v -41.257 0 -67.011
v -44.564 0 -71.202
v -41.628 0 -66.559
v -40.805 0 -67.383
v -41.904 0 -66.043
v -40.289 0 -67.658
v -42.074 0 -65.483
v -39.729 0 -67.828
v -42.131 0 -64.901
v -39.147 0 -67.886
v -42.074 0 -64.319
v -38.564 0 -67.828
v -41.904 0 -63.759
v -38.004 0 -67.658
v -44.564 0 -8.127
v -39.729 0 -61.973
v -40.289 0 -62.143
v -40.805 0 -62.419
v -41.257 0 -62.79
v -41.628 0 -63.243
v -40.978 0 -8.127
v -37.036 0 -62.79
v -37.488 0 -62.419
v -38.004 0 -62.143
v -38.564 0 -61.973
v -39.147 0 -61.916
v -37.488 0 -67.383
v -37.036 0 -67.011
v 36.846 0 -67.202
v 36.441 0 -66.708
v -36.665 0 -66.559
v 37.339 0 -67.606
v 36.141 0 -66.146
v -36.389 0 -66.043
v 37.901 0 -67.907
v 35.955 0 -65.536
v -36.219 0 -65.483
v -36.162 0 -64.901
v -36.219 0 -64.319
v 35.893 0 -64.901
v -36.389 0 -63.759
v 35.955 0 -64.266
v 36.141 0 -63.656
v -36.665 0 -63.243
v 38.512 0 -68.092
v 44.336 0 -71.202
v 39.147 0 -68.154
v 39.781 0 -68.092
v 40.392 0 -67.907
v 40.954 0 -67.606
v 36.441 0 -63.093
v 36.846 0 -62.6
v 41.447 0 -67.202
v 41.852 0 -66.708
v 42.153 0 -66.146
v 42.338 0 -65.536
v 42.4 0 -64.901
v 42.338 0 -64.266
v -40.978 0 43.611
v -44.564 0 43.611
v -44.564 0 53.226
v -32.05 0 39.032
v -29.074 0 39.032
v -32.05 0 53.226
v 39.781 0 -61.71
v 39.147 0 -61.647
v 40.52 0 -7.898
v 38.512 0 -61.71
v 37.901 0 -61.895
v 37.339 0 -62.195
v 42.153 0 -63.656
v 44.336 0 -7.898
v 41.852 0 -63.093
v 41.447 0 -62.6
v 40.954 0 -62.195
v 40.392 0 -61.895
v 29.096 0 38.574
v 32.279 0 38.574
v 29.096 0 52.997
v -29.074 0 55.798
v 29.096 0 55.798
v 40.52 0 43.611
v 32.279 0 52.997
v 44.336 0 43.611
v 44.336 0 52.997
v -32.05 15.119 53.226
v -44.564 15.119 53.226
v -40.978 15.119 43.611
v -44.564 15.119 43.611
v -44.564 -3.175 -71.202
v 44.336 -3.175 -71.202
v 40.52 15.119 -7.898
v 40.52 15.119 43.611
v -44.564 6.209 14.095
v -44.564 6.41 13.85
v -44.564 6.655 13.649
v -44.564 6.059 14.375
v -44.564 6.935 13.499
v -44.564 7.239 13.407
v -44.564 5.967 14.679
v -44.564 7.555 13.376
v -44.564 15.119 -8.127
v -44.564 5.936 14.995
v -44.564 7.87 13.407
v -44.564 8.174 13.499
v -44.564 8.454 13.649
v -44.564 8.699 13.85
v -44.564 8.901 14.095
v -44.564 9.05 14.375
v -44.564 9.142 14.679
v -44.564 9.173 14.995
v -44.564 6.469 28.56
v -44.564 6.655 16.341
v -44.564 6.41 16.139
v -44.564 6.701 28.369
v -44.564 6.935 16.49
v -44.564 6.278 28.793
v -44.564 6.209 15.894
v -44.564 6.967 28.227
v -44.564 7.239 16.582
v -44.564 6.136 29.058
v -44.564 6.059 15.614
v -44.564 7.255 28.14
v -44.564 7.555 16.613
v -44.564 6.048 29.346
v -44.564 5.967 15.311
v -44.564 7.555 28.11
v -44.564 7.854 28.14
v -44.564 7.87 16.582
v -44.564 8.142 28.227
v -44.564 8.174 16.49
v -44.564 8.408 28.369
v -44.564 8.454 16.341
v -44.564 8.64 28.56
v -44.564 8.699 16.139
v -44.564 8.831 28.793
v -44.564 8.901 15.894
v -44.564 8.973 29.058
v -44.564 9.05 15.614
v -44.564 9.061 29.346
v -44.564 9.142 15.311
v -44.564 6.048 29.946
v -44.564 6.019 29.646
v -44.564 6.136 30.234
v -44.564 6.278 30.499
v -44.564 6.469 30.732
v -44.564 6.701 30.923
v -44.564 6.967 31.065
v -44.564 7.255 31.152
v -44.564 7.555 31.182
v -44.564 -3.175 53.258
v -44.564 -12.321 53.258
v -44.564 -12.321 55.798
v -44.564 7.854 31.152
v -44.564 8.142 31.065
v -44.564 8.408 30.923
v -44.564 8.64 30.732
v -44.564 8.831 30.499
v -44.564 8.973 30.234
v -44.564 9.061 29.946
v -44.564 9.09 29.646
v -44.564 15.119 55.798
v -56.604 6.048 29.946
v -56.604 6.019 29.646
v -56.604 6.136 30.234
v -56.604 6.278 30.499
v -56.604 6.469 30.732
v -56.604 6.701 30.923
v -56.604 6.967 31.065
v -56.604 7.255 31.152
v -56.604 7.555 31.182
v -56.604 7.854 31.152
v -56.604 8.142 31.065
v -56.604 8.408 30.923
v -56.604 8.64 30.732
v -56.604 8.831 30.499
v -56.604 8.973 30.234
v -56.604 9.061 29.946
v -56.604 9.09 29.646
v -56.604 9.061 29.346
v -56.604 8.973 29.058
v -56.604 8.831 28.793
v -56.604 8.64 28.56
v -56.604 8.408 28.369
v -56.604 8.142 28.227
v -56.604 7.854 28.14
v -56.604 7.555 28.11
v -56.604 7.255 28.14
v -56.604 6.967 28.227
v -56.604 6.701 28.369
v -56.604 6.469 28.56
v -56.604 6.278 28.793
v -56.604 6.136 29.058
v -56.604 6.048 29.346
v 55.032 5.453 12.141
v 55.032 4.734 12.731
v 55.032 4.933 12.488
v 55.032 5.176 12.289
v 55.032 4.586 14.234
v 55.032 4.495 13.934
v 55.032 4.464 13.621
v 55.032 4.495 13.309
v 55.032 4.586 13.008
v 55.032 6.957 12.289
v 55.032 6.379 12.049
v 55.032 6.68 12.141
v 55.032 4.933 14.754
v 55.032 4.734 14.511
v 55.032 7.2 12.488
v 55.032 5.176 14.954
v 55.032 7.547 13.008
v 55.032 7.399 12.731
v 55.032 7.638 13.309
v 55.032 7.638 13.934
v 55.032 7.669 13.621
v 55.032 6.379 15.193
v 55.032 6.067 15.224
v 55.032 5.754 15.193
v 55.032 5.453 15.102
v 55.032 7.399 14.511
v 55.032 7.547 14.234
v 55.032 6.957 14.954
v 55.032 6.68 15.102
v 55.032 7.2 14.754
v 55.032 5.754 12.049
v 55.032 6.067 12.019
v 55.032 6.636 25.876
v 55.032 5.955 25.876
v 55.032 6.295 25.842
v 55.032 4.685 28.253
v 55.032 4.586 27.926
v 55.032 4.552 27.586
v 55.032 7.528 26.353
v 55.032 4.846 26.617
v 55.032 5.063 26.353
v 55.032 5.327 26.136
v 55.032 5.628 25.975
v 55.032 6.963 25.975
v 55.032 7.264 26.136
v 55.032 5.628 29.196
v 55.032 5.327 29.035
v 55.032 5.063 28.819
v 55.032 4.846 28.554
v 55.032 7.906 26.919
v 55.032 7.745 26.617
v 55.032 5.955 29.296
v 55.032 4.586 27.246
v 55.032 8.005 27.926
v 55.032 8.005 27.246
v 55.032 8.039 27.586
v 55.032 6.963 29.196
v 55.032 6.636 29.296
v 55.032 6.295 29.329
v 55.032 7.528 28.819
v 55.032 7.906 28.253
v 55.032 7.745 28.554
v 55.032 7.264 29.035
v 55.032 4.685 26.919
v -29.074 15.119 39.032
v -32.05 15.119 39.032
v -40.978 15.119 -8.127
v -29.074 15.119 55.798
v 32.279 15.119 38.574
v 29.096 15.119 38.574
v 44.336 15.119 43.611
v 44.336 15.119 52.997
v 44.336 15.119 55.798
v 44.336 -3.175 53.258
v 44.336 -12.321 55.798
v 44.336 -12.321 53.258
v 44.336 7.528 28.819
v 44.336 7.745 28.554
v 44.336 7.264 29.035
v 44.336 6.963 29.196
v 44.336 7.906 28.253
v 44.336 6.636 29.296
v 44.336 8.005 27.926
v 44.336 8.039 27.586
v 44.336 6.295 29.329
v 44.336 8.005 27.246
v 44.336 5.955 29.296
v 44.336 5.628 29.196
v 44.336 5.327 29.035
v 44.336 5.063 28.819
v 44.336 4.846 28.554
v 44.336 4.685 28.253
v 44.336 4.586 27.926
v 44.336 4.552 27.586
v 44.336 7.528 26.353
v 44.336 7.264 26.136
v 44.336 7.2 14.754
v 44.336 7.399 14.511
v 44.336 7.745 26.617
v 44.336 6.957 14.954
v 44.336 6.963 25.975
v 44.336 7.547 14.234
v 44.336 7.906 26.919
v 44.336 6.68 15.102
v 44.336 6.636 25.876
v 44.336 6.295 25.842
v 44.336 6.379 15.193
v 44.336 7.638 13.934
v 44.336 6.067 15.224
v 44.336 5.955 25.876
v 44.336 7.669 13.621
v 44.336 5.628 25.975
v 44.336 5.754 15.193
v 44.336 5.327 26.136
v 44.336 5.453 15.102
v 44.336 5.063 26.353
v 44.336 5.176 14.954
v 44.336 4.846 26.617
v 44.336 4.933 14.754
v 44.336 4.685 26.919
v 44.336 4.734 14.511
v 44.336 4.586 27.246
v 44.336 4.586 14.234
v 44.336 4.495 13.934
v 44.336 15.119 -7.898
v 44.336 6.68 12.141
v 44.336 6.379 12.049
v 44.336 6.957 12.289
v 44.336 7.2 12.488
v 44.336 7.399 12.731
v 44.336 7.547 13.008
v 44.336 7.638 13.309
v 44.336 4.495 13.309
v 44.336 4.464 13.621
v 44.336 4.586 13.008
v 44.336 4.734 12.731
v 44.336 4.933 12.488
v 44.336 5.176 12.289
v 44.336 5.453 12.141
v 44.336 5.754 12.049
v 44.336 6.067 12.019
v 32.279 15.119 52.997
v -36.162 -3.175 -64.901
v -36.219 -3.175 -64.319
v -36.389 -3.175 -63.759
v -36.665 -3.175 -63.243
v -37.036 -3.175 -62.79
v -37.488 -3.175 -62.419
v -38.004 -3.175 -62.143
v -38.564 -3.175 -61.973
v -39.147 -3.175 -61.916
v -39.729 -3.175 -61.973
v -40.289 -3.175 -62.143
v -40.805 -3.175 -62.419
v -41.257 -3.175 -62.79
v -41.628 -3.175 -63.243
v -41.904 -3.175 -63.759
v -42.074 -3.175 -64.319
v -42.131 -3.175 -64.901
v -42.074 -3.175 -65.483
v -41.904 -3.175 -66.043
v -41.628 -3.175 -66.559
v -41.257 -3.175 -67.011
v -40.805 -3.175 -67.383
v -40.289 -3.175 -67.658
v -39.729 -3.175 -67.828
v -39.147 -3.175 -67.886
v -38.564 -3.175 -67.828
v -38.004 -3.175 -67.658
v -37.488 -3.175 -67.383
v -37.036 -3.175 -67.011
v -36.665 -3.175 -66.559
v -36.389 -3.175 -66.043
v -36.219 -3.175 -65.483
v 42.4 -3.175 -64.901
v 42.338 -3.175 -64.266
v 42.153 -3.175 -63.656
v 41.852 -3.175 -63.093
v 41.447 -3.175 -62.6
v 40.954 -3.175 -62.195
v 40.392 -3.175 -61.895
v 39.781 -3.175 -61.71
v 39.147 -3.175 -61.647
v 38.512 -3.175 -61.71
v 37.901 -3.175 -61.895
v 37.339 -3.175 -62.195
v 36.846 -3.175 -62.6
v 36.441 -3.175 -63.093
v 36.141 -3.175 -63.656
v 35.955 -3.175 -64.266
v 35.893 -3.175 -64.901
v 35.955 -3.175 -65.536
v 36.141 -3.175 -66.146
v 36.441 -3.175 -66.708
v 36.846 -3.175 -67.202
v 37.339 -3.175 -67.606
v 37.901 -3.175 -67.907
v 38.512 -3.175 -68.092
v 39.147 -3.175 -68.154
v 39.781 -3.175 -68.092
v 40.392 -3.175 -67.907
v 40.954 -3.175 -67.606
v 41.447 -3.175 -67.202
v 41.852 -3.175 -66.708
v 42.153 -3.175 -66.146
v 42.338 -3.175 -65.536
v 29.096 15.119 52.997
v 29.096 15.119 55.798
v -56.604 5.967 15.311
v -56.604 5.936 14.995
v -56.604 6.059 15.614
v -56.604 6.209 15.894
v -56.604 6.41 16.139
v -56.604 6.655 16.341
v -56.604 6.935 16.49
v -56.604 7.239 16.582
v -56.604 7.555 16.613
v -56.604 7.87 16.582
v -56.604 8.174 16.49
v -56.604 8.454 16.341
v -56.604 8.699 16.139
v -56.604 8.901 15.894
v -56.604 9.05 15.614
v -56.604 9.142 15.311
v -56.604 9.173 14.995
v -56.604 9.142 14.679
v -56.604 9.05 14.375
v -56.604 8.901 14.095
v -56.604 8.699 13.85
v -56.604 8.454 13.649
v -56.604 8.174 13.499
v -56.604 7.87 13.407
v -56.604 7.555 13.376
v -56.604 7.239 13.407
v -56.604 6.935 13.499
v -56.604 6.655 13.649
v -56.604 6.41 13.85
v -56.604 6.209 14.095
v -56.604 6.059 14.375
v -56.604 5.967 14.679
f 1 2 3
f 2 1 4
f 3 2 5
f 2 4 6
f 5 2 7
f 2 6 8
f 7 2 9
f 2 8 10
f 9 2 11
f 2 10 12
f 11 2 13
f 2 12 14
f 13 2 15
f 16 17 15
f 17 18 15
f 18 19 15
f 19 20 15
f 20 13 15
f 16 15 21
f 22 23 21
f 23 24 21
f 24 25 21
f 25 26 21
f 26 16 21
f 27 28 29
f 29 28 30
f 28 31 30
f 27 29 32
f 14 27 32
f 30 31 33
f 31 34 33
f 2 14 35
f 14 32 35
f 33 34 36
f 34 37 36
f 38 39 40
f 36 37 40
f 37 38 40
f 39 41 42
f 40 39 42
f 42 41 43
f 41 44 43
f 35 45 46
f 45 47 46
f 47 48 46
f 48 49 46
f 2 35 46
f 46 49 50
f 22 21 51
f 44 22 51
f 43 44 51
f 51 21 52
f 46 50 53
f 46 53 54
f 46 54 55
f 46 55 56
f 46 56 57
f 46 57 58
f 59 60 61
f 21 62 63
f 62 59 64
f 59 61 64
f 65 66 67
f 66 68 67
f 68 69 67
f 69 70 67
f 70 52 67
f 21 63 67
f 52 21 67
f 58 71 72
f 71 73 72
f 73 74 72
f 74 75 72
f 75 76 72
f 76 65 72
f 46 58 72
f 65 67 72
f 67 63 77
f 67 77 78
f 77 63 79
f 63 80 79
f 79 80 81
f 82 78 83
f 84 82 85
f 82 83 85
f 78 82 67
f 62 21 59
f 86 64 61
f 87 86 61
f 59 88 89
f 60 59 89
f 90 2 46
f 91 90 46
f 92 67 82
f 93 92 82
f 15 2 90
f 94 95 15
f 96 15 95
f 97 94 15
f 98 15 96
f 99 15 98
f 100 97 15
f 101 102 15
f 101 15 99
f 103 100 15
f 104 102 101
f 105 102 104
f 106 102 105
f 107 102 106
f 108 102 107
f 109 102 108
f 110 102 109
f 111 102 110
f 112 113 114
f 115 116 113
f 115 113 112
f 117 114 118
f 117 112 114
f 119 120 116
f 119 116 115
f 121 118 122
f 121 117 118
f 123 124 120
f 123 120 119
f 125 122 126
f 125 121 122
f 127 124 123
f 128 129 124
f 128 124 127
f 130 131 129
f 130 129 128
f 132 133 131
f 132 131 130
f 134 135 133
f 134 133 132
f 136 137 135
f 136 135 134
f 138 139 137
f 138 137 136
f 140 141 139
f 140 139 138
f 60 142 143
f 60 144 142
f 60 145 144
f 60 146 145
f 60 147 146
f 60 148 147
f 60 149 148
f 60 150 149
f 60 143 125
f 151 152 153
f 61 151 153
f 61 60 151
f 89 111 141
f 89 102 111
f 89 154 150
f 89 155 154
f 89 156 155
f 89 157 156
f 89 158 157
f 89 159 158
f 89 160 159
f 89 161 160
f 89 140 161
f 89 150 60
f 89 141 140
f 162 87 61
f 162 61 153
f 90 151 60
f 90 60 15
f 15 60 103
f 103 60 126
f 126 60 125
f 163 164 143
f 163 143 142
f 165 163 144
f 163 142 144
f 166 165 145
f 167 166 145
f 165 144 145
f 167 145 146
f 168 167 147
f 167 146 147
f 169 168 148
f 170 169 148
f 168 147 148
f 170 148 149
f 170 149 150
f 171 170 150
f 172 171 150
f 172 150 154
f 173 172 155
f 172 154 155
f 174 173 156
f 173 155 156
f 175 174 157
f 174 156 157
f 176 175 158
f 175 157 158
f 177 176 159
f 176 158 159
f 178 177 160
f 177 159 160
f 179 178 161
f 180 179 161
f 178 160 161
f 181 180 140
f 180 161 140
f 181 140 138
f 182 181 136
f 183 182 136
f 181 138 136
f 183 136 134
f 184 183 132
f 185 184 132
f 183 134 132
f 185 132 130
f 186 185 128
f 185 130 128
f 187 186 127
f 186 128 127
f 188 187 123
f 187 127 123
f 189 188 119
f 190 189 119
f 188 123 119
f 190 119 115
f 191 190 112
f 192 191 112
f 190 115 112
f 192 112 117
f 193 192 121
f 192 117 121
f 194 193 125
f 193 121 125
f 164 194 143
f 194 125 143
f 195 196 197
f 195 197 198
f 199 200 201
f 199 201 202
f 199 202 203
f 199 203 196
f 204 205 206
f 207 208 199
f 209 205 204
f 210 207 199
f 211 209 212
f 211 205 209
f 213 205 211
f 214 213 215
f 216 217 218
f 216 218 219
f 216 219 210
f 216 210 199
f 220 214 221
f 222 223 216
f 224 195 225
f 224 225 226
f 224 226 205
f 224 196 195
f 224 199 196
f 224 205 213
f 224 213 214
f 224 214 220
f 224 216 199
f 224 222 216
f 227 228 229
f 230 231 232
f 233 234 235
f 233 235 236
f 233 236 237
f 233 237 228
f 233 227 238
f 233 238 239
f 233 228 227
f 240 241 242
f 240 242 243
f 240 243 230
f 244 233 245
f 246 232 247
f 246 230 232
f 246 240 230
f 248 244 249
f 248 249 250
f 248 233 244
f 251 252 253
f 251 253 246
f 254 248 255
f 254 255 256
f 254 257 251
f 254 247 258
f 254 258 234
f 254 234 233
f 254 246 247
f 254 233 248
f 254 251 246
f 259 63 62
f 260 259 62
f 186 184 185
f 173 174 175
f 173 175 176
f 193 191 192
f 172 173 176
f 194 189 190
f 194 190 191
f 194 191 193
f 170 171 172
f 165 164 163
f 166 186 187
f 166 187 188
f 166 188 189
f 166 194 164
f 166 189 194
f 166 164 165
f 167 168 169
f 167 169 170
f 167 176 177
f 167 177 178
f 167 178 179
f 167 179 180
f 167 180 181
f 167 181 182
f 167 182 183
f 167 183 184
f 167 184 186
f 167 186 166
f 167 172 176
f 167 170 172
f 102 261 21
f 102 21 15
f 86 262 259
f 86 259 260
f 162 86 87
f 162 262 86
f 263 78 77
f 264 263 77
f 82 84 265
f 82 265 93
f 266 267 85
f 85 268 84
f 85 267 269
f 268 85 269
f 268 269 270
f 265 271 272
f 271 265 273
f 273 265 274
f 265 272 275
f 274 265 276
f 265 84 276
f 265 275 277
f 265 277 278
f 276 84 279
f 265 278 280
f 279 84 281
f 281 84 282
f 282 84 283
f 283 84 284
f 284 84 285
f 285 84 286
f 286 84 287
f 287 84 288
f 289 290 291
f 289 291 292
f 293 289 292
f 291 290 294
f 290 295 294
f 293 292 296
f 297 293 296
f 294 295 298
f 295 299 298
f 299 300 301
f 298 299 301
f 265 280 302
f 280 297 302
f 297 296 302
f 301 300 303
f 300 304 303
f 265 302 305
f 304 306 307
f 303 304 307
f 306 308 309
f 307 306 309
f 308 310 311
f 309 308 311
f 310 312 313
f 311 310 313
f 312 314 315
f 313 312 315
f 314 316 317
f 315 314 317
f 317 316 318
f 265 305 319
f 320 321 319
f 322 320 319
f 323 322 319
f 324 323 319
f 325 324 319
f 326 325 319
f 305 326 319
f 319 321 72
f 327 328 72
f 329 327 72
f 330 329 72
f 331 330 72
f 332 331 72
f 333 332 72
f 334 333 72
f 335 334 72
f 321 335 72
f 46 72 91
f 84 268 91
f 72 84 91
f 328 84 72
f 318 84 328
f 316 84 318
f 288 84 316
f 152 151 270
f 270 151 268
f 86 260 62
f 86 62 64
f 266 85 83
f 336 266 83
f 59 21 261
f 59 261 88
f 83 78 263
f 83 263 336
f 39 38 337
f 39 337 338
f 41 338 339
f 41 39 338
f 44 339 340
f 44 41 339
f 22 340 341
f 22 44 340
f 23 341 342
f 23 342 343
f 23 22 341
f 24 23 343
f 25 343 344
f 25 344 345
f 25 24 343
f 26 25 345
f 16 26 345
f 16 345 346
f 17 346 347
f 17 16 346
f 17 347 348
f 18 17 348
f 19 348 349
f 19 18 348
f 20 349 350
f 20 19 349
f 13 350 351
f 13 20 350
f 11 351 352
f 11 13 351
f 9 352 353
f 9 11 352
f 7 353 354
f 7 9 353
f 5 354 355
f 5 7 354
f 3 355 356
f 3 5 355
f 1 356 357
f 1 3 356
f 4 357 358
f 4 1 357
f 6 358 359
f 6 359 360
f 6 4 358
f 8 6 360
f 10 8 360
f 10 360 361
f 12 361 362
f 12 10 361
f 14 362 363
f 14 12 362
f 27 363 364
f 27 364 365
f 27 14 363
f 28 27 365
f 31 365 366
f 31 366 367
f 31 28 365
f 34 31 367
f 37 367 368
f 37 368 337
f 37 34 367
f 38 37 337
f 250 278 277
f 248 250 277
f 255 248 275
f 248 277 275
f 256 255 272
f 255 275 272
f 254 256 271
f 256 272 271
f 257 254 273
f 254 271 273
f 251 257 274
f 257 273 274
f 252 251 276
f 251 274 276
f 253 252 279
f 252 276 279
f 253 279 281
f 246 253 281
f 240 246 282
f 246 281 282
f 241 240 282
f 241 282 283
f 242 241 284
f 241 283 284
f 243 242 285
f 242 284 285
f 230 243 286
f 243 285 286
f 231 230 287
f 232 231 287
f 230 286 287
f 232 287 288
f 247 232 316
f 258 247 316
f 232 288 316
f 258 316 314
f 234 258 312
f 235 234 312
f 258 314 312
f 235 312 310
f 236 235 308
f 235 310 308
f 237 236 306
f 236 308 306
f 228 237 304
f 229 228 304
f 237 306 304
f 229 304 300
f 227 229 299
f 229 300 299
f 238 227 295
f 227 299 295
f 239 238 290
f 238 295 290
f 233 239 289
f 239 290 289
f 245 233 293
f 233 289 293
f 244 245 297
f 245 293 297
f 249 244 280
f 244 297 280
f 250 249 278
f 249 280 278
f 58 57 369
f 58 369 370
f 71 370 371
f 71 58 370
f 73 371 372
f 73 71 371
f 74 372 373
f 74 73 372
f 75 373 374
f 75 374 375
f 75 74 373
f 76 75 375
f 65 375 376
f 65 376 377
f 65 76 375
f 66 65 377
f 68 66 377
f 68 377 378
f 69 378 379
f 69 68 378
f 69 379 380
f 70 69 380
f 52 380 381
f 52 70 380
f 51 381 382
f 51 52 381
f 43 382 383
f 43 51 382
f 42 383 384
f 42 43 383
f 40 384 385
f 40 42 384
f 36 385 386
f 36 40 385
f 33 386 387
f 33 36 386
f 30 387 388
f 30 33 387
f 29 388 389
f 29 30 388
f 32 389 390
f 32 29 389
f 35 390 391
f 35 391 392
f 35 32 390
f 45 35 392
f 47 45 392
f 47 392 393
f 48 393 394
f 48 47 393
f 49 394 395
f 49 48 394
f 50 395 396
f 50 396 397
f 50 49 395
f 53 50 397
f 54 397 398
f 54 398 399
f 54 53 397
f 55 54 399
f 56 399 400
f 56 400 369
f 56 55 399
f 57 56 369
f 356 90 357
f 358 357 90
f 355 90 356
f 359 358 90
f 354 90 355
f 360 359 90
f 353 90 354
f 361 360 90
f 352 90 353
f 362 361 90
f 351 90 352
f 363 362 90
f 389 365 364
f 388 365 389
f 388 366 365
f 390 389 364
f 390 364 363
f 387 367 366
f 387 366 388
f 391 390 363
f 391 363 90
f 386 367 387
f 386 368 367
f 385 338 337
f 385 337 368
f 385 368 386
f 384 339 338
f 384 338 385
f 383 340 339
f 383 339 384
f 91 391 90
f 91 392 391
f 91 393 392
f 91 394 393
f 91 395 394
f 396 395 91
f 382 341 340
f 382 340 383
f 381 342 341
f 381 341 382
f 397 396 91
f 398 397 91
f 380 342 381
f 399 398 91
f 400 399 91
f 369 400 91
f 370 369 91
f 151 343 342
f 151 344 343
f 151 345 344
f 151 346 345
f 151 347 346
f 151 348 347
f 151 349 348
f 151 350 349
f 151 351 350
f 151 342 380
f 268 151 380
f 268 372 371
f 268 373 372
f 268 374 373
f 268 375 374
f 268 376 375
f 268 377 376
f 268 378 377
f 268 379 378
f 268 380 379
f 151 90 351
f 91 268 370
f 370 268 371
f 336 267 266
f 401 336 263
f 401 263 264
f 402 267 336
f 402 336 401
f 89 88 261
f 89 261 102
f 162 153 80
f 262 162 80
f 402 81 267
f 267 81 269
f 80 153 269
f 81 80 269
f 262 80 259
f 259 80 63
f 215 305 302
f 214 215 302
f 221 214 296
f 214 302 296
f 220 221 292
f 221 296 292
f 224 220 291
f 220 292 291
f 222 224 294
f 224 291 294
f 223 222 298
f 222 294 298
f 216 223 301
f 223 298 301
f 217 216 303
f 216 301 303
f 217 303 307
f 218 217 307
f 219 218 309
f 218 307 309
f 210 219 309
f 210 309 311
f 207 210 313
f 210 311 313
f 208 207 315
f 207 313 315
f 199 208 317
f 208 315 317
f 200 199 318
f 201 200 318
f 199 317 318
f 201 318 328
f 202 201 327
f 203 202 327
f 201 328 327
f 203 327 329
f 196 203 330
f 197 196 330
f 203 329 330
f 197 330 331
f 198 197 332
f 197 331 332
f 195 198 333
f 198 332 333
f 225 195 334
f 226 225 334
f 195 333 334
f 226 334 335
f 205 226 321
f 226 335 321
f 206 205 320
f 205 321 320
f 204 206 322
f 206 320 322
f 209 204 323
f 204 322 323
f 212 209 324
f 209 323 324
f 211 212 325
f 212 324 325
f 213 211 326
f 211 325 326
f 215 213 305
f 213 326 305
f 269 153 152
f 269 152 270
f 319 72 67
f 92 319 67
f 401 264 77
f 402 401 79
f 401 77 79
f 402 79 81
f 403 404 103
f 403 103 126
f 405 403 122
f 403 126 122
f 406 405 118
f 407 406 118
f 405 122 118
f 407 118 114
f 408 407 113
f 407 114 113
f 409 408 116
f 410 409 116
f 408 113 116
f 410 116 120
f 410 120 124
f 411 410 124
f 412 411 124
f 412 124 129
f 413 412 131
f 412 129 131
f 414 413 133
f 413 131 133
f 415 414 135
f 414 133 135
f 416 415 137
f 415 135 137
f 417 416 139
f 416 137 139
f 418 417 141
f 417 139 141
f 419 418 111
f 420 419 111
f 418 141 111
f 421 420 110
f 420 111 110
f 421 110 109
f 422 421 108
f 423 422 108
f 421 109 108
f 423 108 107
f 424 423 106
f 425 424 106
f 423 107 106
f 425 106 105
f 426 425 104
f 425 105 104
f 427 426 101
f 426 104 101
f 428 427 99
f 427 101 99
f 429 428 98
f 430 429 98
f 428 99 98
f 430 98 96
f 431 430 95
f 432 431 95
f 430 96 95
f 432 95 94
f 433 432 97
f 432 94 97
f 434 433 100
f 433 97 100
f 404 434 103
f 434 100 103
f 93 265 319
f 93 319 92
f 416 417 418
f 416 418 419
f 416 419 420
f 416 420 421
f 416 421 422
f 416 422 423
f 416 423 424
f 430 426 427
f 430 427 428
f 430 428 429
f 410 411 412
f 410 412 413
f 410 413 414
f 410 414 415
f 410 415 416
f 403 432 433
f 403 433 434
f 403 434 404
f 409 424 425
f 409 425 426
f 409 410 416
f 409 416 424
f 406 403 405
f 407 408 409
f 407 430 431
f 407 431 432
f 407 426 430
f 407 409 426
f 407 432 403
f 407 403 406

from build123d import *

# Parameters (mm, degrees)
F0_W     = 88.9
F0_H     = 127
F0_R     = 2.9848451786
F0_R_2   = 3.2536679358
F1_DEPTH = 3.175
F2_W     = 88.9
F2_H     = 2.54
F3_DEPTH = 9.14618
F4_W     = 3.1831779712
F4_H     = 14.4224017859
F4_W_2   = 3.8154479831
F4_H_2   = 51.5085849911
F4_W_3   = 2.9760506004
F4_H_3   = 14.1934752464
F4_W_4   = 3.5865214437
F4_H_4   = 51.7375124618
F5_DEPTH = 15.11912
F6_R     = 1.7434569234
F6_R_2   = 1.6024885699
F7_DEPTH = 10.69614
F8_R     = 1.5356896605
F8_R_2   = 1.6187597598
F9_DEPTH = 12.03988


with BuildPart() as f1:
    # F0 (on Front) → F1 (new body)
    with BuildSketch(Plane.XZ):
        with Locations((-0.1144651324, -7.7015060779)):
            Rectangle(F0_W, F0_H)
        with Locations((-39.1465239227, -64.9008154869)):
            Circle(F0_R, mode=Mode.SUBTRACT)
        with Locations((39.1465201974, -64.9008154869)):
            Circle(F0_R_2, mode=Mode.SUBTRACT)
    extrude(amount=F1_DEPTH)

    # F2 (on face) → F3 (join)
    with BuildSketch(Plane.XZ.offset(3.175)):
        with Locations((-0.1144651324, 54.5284939221)):
            Rectangle(F2_W, F2_H)
    extrude(amount=F3_DEPTH)

    # F4 (on face) → F5 (join)
    with BuildSketch(Plane(origin=(0, 0, 0), x_dir=(-1, 0, 0), z_dir=(0, 1, 0))):
        Polygon((-29.0955348676, 55.4166970754), (-29.0955348676, 55.7984939221), (-44.3355348676, 55.7984939221), (-44.3355348676, 55.4166970754), (-44.3355348676, 52.99660936), (-32.2787128389, 52.99660936), (-29.0955348676, 52.99660936), align=None)
        with Locations((-30.6871238533, 45.7854084671)):
            Rectangle(F4_W, F4_H)
        with Locations((-42.4278108761, 17.8563101217)):
            Rectangle(F4_W_2, F4_H_2)
        Polygon((44.5644651324, 55.7984939221), (29.0737356991, 55.7984939221), (29.0737356991, 53.2255358994), (32.0497862995, 53.2255358994), (40.7490134239, 53.2255358994), (44.5644651324, 53.2255358994), align=None)
        with Locations((30.5617609993, 46.1287982762)):
            Rectangle(F4_W_3, F4_H_3)
        with Locations((42.7712044105, 17.7418463863)):
            Rectangle(F4_W_4, F4_H_4)
    extrude(amount=F5_DEPTH)

    # F6 (on face) → F7 (join)
    with BuildSketch(Plane.YZ.offset(44.3355348676)):
        with Locations((6.2954924069, 27.5857094675)):
            Circle(F6_R)
        with Locations((6.0665672645, 13.6211588979)):
            Circle(F6_R_2)
    extrude(amount=F7_DEPTH)

    # F8 (on face) → F9 (join)
    with BuildSketch(Plane(origin=(-44.5644651324, 0, 0), x_dir=(0, -1, 0), z_dir=(-1, 0, 0))):
        with Locations((-7.554592099, 29.6460520476)):
            Circle(F8_R)
        with Locations((-7.554592099, 14.9947218597)):
            Circle(F8_R_2)
    extrude(amount=F9_DEPTH)


solid = f1.part
